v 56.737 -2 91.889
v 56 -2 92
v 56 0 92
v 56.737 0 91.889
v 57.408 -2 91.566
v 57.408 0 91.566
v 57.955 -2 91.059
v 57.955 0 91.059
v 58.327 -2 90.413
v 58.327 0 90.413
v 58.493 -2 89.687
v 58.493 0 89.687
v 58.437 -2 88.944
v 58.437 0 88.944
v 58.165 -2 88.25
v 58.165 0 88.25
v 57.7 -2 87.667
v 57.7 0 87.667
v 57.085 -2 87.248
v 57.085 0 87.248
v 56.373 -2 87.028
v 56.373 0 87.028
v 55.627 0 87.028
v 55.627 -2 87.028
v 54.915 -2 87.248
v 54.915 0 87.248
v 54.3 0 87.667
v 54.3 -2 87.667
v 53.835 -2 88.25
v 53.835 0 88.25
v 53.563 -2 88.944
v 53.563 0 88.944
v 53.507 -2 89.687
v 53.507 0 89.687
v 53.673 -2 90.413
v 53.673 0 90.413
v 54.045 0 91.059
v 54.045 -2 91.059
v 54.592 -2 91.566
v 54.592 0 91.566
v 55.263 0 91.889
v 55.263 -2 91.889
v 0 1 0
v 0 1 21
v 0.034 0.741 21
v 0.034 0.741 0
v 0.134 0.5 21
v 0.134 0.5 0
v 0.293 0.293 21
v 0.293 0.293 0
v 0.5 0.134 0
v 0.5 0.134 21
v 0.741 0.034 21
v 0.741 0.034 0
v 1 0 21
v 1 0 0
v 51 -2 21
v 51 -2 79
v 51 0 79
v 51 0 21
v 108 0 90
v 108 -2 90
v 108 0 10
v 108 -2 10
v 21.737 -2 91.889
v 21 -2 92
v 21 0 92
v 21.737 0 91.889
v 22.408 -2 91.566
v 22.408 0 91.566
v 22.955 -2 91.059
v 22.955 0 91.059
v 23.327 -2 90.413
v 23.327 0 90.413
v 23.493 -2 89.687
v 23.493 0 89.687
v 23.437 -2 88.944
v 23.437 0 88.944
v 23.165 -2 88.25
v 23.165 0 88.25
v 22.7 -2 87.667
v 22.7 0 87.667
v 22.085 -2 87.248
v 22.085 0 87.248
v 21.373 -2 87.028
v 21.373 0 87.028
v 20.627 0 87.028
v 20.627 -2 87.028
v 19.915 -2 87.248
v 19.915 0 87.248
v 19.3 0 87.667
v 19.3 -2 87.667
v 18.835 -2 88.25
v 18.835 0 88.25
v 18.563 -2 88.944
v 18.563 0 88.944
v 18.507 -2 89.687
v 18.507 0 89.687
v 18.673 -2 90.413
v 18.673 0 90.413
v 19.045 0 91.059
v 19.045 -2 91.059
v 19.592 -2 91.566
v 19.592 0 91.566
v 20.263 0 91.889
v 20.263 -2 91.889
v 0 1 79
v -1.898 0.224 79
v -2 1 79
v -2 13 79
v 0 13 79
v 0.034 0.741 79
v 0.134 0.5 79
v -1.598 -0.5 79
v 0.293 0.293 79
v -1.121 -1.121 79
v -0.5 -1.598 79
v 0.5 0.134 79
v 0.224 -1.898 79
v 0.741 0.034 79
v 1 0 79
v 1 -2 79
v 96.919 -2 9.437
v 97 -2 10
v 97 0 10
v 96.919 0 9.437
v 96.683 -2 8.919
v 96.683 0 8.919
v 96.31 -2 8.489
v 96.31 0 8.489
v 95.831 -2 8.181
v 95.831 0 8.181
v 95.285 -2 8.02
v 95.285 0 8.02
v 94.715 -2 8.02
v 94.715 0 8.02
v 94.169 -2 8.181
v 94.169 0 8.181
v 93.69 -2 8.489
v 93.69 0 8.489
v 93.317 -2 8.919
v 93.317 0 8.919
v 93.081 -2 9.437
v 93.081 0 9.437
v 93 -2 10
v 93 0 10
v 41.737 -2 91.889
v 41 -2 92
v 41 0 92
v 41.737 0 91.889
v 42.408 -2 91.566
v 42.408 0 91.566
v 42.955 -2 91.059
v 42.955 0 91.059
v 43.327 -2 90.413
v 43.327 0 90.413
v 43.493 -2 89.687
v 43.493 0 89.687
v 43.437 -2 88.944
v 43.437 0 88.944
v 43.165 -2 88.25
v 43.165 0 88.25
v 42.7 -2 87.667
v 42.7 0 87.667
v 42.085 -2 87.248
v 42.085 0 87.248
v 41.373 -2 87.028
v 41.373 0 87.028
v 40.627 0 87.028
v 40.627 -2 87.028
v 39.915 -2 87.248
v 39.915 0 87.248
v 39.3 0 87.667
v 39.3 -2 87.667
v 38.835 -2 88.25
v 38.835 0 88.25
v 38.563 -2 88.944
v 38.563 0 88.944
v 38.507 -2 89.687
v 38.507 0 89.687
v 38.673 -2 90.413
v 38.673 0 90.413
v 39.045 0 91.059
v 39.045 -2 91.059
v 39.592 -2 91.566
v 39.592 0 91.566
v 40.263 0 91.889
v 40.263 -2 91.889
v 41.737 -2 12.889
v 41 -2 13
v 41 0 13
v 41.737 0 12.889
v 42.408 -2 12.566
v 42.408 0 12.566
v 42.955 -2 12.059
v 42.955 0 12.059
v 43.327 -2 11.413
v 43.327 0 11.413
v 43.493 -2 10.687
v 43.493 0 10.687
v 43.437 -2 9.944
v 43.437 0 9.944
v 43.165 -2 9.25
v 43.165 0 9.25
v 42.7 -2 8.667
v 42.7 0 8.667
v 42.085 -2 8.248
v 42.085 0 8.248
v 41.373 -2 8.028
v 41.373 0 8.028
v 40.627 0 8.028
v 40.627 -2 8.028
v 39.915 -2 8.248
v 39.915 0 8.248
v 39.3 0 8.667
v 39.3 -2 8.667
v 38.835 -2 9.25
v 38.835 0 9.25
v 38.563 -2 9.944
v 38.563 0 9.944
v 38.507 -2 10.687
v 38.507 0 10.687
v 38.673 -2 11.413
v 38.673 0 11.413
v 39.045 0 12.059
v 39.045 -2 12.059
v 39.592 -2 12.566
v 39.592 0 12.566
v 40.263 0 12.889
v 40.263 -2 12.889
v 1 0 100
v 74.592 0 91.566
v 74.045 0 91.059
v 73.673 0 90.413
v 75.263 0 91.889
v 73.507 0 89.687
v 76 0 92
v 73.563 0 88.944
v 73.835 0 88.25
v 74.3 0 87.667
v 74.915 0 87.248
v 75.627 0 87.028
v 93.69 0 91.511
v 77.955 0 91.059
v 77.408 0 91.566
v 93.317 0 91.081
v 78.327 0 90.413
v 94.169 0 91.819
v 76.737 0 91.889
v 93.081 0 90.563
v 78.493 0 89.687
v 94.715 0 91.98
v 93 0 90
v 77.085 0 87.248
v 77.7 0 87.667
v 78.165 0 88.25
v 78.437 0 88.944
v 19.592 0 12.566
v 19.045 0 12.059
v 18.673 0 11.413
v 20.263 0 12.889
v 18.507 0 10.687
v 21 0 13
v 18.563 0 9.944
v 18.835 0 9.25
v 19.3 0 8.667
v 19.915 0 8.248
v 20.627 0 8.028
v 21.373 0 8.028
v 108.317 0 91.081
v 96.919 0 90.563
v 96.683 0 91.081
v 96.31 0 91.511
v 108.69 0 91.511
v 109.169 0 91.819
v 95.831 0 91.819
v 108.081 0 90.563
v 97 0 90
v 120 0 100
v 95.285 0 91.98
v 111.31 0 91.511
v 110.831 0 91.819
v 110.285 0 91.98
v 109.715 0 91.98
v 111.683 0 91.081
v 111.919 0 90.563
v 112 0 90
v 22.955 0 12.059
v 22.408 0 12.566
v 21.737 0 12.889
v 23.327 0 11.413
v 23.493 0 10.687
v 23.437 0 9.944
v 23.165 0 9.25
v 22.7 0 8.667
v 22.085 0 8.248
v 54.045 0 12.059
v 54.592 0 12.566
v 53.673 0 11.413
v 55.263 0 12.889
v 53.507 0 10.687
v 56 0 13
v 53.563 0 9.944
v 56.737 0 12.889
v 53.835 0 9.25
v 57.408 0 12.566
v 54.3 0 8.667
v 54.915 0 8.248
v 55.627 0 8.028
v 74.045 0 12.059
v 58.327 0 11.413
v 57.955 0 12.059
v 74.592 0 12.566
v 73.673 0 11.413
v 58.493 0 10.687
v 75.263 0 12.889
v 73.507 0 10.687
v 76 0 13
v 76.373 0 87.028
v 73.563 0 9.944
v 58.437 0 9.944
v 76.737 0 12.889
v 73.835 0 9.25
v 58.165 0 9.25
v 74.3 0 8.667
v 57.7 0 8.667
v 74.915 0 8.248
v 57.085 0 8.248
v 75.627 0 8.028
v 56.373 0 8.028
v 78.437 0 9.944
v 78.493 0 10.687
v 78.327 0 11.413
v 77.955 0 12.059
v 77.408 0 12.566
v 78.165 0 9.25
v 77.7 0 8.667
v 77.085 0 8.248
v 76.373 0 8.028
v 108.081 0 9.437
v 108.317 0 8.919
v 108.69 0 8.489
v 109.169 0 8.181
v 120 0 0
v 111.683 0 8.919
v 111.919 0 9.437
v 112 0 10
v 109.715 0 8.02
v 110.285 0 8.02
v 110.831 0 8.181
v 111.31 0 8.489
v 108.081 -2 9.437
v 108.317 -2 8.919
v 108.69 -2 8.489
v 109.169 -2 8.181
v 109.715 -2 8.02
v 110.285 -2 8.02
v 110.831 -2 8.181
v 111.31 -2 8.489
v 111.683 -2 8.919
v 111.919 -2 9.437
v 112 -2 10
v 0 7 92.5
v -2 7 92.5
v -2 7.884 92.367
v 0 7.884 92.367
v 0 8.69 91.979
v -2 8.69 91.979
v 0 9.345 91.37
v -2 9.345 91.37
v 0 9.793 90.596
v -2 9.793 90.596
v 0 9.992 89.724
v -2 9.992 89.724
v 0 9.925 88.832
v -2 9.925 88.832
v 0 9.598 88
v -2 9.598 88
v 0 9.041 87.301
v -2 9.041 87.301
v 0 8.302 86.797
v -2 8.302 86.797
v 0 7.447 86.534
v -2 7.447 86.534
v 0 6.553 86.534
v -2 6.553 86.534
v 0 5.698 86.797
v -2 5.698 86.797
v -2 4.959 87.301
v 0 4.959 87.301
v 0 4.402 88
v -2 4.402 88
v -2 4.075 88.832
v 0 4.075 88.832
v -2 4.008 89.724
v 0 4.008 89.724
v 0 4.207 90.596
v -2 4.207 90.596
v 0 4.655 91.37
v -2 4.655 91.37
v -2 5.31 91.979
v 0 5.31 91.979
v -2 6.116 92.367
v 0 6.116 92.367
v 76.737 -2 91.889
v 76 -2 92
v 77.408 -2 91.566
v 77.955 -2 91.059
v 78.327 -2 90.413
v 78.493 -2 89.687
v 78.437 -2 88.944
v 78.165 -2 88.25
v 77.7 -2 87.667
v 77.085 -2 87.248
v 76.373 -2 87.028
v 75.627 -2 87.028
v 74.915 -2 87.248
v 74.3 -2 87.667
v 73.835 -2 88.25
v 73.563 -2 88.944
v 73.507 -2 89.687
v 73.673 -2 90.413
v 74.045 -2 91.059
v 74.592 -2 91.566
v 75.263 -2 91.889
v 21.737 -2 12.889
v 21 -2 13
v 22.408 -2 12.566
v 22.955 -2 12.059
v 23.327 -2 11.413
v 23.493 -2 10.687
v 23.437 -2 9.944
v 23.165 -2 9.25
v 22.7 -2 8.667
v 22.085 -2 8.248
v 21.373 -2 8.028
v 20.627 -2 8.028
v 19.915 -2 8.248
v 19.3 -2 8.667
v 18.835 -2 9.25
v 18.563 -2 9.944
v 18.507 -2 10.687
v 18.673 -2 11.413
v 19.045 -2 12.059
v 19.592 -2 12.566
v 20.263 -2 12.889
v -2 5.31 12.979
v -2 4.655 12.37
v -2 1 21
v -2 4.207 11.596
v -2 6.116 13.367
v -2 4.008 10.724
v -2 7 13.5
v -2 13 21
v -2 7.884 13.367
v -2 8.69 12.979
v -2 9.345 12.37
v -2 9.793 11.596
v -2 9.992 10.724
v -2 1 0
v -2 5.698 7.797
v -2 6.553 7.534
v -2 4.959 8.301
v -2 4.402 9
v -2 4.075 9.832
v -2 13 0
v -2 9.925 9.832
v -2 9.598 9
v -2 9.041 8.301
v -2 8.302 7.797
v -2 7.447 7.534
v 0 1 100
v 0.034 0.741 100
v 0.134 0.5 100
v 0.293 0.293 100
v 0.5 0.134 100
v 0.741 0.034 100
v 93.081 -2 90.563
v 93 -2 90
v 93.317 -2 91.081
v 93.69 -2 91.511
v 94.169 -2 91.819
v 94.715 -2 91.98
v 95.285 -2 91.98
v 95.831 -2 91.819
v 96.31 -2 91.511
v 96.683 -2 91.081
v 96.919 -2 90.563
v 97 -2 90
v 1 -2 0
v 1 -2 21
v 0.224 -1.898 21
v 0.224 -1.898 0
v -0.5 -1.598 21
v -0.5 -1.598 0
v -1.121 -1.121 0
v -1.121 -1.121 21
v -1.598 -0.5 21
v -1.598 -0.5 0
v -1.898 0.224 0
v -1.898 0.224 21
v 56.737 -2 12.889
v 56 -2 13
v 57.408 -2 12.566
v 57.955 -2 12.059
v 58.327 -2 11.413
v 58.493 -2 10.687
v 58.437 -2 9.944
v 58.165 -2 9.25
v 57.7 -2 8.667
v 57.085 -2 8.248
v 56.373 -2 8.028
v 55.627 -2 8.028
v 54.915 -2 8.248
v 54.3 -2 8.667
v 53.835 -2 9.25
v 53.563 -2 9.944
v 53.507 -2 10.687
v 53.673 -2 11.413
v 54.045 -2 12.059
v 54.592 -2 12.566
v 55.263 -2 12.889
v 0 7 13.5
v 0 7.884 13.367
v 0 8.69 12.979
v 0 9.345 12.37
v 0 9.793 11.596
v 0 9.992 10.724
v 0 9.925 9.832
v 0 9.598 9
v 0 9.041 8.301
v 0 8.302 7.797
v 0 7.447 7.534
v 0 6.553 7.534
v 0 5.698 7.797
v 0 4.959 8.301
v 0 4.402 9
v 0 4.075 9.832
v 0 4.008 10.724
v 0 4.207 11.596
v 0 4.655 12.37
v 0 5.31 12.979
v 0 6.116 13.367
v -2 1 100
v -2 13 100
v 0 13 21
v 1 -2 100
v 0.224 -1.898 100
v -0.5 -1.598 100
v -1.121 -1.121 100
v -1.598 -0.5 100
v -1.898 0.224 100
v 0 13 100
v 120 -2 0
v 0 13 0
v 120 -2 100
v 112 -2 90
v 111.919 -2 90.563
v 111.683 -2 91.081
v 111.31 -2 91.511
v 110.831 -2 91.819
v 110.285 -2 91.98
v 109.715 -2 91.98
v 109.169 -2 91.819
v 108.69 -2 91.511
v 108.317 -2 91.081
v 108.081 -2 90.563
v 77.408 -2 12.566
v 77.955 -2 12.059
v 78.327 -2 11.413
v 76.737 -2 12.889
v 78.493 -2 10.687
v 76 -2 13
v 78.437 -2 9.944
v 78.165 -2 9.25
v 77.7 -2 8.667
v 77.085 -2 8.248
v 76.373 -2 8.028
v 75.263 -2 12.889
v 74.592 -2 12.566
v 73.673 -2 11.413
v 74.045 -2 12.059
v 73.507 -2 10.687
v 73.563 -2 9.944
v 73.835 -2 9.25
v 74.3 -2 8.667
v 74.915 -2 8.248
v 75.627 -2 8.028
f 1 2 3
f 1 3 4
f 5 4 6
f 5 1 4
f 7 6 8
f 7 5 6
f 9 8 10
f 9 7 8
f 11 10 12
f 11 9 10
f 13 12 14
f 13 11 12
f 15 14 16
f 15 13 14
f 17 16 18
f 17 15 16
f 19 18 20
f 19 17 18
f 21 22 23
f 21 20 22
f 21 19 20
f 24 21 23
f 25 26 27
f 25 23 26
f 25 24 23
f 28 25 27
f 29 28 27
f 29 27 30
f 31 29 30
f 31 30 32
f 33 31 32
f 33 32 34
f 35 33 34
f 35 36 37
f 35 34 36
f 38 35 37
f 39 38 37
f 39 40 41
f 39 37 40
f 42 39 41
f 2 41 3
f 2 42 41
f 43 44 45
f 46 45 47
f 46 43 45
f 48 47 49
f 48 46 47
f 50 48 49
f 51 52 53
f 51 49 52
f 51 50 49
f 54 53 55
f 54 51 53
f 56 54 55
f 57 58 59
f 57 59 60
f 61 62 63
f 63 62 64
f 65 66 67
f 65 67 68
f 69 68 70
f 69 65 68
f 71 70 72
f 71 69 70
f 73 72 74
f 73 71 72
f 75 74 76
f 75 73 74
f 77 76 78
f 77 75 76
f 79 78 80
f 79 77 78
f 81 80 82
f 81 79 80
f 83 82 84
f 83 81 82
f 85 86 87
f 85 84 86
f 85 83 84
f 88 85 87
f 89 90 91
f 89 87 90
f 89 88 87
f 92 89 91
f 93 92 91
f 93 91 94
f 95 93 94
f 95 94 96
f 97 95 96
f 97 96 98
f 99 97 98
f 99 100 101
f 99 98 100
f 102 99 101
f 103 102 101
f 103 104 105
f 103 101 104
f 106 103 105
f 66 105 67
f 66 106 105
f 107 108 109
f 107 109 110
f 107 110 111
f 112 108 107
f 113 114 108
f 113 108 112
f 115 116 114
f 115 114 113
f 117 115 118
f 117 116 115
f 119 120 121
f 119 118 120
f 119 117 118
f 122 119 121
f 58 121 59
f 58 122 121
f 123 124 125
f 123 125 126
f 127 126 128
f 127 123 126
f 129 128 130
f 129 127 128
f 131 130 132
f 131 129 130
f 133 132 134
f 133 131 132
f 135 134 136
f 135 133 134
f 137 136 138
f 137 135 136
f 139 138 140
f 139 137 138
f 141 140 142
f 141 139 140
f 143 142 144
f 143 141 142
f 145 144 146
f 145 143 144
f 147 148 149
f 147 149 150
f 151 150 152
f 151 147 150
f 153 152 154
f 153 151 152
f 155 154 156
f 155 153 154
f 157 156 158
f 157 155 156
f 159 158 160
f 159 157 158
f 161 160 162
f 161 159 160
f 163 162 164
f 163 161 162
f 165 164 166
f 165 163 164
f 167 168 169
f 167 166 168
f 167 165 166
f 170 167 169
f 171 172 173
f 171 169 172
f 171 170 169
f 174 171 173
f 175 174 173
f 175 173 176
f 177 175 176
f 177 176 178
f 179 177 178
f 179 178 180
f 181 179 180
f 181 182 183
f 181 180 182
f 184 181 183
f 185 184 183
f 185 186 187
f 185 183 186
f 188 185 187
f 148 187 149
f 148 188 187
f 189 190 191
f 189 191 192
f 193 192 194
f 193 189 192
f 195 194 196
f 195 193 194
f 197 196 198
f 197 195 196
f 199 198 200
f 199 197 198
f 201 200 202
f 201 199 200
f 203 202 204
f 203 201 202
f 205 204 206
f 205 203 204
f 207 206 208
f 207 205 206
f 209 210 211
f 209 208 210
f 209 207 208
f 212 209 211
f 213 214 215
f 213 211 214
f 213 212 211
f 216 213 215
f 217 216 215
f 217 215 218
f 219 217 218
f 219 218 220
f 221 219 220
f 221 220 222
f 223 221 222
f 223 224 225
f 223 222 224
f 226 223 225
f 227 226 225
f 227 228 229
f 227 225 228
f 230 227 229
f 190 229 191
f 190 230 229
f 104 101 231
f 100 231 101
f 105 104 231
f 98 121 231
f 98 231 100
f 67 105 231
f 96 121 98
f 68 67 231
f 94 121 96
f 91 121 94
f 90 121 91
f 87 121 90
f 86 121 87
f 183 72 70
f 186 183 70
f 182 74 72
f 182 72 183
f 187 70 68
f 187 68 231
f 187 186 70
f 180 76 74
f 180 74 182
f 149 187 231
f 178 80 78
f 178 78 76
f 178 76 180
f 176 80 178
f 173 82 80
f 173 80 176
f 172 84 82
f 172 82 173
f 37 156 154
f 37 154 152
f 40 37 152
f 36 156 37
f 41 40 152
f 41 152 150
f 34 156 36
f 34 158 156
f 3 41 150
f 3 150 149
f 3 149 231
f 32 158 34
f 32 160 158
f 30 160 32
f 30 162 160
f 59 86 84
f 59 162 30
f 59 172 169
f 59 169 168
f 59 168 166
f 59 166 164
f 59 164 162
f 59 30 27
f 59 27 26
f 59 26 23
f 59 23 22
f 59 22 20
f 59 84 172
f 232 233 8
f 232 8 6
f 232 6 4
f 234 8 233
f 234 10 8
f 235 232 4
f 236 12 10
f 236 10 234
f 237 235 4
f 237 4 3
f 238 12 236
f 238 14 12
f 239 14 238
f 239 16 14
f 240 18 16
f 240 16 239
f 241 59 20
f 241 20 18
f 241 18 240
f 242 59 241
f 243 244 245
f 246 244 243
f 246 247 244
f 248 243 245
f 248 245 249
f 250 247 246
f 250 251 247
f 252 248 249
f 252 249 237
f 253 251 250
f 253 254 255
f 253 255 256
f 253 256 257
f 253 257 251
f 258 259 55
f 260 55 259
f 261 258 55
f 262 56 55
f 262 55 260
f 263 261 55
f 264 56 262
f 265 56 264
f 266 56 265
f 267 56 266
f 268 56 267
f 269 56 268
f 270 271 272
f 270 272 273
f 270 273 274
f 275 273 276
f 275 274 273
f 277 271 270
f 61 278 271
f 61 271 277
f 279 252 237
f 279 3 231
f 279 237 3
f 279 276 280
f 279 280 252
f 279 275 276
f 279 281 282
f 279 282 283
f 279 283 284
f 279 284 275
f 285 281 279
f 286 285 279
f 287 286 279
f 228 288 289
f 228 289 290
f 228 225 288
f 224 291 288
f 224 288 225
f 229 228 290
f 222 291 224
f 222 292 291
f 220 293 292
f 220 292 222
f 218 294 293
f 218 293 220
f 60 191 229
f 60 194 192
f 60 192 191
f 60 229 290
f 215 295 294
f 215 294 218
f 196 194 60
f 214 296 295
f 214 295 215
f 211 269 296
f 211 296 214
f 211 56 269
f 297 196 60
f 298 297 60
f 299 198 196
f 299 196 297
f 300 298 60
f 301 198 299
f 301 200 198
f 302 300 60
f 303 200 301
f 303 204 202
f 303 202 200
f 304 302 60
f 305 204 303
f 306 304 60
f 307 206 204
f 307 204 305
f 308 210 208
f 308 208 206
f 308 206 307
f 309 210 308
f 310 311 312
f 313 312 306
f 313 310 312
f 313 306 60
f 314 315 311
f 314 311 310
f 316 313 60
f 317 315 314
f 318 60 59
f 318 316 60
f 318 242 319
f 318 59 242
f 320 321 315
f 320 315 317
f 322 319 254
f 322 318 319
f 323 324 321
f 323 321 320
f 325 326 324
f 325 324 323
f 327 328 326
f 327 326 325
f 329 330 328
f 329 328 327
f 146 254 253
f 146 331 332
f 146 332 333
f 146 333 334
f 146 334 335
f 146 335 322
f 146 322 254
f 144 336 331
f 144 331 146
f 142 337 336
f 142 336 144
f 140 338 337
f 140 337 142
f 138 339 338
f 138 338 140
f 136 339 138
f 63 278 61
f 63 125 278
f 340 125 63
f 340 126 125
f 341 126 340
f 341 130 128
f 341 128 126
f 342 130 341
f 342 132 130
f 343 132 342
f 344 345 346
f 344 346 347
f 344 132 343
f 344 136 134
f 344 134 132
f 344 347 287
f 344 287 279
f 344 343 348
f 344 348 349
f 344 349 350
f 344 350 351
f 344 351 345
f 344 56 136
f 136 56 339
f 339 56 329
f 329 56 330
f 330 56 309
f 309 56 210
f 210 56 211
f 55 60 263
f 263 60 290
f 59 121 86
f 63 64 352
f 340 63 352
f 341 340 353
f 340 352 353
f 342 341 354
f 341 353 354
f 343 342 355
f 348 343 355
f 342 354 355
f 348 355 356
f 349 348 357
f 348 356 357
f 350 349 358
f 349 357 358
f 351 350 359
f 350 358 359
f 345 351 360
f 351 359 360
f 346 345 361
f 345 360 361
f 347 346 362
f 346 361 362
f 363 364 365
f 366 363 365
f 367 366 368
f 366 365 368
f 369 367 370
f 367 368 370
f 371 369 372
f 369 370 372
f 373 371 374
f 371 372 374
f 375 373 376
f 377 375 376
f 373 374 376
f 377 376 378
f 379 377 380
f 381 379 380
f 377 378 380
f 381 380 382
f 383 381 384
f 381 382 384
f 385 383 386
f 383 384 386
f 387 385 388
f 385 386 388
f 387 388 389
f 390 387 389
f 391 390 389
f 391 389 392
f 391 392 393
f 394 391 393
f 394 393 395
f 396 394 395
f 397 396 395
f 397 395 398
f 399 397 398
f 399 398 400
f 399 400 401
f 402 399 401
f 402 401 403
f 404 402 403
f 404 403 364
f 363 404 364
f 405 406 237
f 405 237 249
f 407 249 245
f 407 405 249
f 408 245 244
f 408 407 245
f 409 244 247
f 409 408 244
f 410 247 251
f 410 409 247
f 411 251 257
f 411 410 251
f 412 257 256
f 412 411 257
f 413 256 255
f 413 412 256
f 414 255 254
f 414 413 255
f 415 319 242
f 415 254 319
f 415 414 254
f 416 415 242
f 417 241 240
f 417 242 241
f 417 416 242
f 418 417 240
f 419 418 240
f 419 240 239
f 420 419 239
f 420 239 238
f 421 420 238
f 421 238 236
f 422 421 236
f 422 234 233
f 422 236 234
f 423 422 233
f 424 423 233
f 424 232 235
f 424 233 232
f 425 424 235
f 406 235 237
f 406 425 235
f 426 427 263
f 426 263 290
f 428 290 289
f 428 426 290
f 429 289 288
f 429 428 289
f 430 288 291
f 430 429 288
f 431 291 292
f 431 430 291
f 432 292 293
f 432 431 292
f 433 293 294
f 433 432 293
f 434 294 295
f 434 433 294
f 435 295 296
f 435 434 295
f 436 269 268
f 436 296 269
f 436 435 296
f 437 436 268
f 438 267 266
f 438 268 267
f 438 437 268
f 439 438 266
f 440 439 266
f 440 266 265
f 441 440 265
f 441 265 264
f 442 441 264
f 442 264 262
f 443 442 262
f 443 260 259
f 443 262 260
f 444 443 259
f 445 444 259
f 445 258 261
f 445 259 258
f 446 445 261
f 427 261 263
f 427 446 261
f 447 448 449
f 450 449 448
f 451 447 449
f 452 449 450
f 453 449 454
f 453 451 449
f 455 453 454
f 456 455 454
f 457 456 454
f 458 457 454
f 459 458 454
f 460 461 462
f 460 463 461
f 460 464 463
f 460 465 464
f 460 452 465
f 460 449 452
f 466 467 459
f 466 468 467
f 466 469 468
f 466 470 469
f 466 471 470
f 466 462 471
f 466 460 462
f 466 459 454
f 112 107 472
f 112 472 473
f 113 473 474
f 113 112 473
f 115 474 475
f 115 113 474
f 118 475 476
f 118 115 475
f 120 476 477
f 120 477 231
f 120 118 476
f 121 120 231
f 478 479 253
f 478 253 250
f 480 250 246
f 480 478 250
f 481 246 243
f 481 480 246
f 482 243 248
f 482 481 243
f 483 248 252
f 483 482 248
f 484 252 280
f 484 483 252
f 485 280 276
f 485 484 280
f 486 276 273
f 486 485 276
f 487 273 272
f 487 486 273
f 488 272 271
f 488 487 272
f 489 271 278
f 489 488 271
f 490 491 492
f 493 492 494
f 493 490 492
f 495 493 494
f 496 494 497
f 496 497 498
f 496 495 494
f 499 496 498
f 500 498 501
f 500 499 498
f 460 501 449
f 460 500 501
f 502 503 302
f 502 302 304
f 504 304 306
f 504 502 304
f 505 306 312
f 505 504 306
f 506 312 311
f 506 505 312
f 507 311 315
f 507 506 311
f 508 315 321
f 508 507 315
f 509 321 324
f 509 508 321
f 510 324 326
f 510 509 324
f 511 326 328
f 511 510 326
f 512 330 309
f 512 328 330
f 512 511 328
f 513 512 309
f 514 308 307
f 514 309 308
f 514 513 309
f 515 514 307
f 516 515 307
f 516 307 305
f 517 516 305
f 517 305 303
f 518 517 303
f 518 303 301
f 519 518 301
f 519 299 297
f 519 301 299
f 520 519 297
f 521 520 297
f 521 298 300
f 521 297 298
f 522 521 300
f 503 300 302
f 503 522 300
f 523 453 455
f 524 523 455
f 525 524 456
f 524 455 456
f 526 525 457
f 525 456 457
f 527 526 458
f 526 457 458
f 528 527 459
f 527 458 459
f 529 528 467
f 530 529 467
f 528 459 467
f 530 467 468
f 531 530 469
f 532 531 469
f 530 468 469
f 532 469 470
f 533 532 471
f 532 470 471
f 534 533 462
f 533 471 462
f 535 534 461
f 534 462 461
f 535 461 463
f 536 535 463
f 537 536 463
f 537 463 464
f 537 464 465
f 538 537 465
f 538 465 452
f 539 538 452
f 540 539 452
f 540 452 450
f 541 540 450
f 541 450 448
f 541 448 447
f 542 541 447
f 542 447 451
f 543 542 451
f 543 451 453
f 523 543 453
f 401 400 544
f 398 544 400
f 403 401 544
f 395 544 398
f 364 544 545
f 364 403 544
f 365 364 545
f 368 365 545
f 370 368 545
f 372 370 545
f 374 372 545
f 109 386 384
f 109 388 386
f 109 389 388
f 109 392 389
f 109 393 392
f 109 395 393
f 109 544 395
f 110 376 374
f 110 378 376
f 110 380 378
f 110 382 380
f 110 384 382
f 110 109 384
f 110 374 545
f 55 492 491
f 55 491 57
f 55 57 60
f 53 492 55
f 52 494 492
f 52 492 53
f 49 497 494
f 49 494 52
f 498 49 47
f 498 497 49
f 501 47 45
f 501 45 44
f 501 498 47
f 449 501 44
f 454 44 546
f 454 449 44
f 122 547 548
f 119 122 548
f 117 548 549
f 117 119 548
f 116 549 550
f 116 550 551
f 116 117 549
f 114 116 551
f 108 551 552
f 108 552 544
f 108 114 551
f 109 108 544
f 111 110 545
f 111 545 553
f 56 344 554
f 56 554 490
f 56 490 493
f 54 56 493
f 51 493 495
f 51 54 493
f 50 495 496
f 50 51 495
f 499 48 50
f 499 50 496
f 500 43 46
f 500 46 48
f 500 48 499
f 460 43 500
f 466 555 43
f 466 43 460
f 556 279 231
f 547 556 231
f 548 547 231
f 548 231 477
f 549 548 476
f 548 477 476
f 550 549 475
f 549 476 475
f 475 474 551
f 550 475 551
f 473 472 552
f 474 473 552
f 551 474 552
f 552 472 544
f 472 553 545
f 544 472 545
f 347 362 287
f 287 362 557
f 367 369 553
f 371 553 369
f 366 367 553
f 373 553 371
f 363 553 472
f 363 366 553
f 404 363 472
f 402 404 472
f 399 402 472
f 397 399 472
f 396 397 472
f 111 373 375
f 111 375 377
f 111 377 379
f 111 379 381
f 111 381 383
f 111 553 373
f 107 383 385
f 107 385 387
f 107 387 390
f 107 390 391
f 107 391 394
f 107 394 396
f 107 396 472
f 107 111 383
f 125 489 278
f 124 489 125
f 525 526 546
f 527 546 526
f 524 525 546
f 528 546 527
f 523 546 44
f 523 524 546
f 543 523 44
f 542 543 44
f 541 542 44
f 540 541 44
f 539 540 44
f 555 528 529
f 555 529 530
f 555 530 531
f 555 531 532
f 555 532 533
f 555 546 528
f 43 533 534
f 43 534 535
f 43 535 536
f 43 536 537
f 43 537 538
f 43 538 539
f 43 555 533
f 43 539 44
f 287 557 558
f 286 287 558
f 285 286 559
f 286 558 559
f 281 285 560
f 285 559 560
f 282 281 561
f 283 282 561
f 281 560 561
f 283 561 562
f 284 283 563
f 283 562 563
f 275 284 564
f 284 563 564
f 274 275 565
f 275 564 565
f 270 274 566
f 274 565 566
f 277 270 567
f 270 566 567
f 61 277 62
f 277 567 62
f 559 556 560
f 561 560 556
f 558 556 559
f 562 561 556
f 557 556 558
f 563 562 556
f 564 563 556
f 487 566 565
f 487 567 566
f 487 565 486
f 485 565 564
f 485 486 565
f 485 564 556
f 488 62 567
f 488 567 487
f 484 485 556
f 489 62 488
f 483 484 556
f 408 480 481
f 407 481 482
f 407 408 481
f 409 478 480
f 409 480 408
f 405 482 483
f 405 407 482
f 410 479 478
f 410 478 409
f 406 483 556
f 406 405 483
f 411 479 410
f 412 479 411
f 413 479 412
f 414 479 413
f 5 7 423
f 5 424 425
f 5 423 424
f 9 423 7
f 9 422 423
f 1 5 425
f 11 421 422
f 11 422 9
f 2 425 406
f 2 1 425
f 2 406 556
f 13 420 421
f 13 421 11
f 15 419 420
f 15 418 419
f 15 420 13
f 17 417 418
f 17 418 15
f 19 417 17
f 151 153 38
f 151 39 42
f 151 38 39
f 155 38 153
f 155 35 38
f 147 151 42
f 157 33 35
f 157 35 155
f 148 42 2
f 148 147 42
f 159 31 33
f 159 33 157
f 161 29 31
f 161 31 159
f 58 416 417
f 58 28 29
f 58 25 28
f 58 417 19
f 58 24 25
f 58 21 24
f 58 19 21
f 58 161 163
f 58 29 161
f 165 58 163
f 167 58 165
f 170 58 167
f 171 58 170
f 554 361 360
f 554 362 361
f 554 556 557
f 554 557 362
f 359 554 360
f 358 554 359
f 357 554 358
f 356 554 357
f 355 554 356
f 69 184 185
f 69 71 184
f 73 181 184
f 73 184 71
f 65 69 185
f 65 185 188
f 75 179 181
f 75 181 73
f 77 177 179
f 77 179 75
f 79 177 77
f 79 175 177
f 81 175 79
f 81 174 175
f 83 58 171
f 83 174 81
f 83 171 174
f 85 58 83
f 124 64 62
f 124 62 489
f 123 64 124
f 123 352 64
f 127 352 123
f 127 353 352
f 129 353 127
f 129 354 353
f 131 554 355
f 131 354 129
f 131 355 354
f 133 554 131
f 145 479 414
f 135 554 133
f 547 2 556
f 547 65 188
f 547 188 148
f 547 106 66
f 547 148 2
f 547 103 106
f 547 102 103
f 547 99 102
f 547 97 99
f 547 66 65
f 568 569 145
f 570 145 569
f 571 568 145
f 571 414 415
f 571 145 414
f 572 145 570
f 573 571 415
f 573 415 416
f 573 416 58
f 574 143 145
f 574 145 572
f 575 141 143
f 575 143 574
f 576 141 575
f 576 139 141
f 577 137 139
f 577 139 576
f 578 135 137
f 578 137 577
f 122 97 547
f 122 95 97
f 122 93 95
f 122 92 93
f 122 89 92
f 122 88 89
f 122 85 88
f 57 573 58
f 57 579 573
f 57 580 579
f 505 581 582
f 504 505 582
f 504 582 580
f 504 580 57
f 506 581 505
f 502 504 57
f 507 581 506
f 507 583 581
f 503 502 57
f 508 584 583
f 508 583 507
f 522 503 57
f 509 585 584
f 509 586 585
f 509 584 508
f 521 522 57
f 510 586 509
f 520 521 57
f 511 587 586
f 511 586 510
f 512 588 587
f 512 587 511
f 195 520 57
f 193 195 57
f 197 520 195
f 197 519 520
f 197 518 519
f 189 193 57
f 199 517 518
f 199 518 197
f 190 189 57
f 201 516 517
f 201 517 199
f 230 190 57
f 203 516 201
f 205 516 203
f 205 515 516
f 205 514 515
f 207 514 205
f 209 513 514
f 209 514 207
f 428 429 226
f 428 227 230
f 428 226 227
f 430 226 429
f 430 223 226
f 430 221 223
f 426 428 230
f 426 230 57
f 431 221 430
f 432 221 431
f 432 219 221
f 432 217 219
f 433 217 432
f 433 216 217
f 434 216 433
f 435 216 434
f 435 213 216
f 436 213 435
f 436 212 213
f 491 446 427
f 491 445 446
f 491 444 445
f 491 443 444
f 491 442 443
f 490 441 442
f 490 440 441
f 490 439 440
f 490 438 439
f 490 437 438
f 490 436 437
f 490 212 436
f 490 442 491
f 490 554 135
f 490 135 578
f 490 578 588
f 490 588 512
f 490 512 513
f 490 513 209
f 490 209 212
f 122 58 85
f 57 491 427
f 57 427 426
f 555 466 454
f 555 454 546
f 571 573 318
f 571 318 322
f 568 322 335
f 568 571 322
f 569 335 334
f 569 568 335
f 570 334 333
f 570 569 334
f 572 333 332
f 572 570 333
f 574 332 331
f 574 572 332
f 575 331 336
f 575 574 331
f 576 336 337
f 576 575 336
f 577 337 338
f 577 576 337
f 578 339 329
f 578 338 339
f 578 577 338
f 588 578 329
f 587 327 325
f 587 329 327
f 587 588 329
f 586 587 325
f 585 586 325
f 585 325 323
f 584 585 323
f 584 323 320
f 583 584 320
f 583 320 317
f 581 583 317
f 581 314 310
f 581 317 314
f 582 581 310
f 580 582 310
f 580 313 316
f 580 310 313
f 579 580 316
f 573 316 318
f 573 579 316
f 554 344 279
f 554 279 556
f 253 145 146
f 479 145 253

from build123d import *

# Parameters (mm, degrees)
BASE_FLANGE1_DEPTH      = 100
SKETCH8_W               = 29
SKETCH8_H               = 12
SKETCH8_R               = 3
CUT_EXTRUDE1_DEPTH      = 159.28139499
CUT_EXTRUDE2_DEPTH      = 157.74501587
CUT_EXTRUDE2_DEPTH_BACK = 157.74501587
CUT_EXTRUDE4_START      = -2
CUT_EXTRUDE4_OUTLINE_W  = 3
CUT_EXTRUDE4_OUTLINE_H  = 58
CUT_EXTRUDE4_DEPTH      = 3
CUT_EXTRUDE5_DEPTH      = 157.74501587
CUT_EXTRUDE5_DEPTH_BACK = 157.74501587
SKETCH11_W              = 50
SKETCH11_H              = 58
CUT_EXTRUDE6_DEPTH      = 157.74501587
CUT_EXTRUDE6_DEPTH_BACK = 157.74501587
SKETCH12_R              = 2.5


# Read off the part's stored shape, not the designer's step: Cut-Extrude4
# Sheet-metal steps are written as plain solids
with BuildPart() as part:
    # Sketch1 → Base-Flange1 (new body)
    with BuildSketch(Plane.XY):
        with BuildLine():
            Line((0, 13), (0, 1))
            ThreePointArc((0, 1), (0.292893219, 0.292893219), (1, 0))
            Line((1, 0), (120, 0))
            Line((120, 0), (120, -2))
            Line((120, -2), (1, -2))
            ThreePointArc((1, -2), (-1.121320344, -1.121320344), (-2, 1))
            Line((-2, 1), (-2, 13))
            Line((-2, 13), (0, 13))
        make_face()
    extrude(amount=BASE_FLANGE1_DEPTH)

    # Sketch8 → Cut-Extrude1 (cut, through all)
    with BuildSketch(Plane.ZY.offset(2)):
        with Locations((35.5, 7)):
            Rectangle(SKETCH8_W, SKETCH8_H)
        with Locations((64.5, 7)):
            Rectangle(SKETCH8_W, SKETCH8_H)
        with Locations((10.5, 7)):
            Circle(SKETCH8_R)
        with Locations((89.5, 7)):
            Circle(SKETCH8_R)
    extrude(amount=-CUT_EXTRUDE1_DEPTH, mode=Mode.SUBTRACT)

    # Sketch9 → Cut-Extrude2 (cut, two sides: drawn at the far end of the back side and taken through both)
    with BuildSketch(Plane(origin=(0, 0, 0), x_dir=(1, 0, 0), z_dir=(0, 1, 0)).offset(-CUT_EXTRUDE2_DEPTH_BACK)):
        with BuildLine():
            Line((112, -10), (112, -90))
            ThreePointArc((112, -90), (110, -92), (108, -90))
            Line((108, -90), (108, -10))
            ThreePointArc((108, -10), (110, -8), (112, -10))
        make_face()
        with BuildLine():
            Line((93, -10), (93, -90))
            ThreePointArc((93, -90), (95, -92), (97, -90))
            Line((97, -90), (97, -10))
            ThreePointArc((97, -10), (95, -8), (93, -10))
        make_face()
    extrude(amount=CUT_EXTRUDE2_DEPTH + CUT_EXTRUDE2_DEPTH_BACK, mode=Mode.SUBTRACT)

    # Cut-Extrude4 outline → Cut-Extrude4 (cut)
    with BuildSketch(Plane(origin=(0, 0, 0), x_dir=(1, 0, 0), z_dir=(0, 1, 0)).offset(CUT_EXTRUDE4_START)):
        with Locations((-0.5, -50)):
            Rectangle(CUT_EXTRUDE4_OUTLINE_W, CUT_EXTRUDE4_OUTLINE_H)
    extrude(amount=CUT_EXTRUDE4_DEPTH, mode=Mode.SUBTRACT)

    # Sketch11 → Cut-Extrude5 (cut, two sides: drawn at the far end of the back side and taken through both)
    with BuildSketch(Plane(origin=(0, 0, 0), x_dir=(1, 0, 0), z_dir=(0, 1, 0)).offset(-CUT_EXTRUDE5_DEPTH_BACK)):
        with Locations((26, -50)):
            Rectangle(SKETCH11_W, SKETCH11_H)
    extrude(amount=CUT_EXTRUDE5_DEPTH + CUT_EXTRUDE5_DEPTH_BACK, mode=Mode.SUBTRACT)

    # Sketch12 → Cut-Extrude6 (cut, two sides: drawn at the far end of the back side and taken through both)
    with BuildSketch(Plane(origin=(0, 0, 0), x_dir=(1, 0, 0), z_dir=(0, 1, 0)).offset(-CUT_EXTRUDE6_DEPTH_BACK)):
        with Locations(Location((21, -10.5, 0), (0, 0, 270))):
            Circle(SKETCH12_R)
        with Locations(Location((41, -10.5, 0), (0, 0, 270))):
            Circle(SKETCH12_R)
        with Locations(Location((21, -89.5, 0), (0, 0, 270))):
            Circle(SKETCH12_R)
        with Locations(Location((41, -89.5, 0), (0, 0, 270))):
            Circle(SKETCH12_R)
        with Locations(Location((76, -89.5, 0), (0, 0, 270))):
            Circle(SKETCH12_R)
        with Locations(Location((56, -89.5, 0), (0, 0, 270))):
            Circle(SKETCH12_R)
        with Locations(Location((56, -10.5, 0), (0, 0, 270))):
            Circle(SKETCH12_R)
        with Locations(Location((76, -10.5, 0), (0, 0, 270))):
            Circle(SKETCH12_R)
    extrude(amount=CUT_EXTRUDE6_DEPTH + CUT_EXTRUDE6_DEPTH_BACK, mode=Mode.SUBTRACT)


solid = part.part
